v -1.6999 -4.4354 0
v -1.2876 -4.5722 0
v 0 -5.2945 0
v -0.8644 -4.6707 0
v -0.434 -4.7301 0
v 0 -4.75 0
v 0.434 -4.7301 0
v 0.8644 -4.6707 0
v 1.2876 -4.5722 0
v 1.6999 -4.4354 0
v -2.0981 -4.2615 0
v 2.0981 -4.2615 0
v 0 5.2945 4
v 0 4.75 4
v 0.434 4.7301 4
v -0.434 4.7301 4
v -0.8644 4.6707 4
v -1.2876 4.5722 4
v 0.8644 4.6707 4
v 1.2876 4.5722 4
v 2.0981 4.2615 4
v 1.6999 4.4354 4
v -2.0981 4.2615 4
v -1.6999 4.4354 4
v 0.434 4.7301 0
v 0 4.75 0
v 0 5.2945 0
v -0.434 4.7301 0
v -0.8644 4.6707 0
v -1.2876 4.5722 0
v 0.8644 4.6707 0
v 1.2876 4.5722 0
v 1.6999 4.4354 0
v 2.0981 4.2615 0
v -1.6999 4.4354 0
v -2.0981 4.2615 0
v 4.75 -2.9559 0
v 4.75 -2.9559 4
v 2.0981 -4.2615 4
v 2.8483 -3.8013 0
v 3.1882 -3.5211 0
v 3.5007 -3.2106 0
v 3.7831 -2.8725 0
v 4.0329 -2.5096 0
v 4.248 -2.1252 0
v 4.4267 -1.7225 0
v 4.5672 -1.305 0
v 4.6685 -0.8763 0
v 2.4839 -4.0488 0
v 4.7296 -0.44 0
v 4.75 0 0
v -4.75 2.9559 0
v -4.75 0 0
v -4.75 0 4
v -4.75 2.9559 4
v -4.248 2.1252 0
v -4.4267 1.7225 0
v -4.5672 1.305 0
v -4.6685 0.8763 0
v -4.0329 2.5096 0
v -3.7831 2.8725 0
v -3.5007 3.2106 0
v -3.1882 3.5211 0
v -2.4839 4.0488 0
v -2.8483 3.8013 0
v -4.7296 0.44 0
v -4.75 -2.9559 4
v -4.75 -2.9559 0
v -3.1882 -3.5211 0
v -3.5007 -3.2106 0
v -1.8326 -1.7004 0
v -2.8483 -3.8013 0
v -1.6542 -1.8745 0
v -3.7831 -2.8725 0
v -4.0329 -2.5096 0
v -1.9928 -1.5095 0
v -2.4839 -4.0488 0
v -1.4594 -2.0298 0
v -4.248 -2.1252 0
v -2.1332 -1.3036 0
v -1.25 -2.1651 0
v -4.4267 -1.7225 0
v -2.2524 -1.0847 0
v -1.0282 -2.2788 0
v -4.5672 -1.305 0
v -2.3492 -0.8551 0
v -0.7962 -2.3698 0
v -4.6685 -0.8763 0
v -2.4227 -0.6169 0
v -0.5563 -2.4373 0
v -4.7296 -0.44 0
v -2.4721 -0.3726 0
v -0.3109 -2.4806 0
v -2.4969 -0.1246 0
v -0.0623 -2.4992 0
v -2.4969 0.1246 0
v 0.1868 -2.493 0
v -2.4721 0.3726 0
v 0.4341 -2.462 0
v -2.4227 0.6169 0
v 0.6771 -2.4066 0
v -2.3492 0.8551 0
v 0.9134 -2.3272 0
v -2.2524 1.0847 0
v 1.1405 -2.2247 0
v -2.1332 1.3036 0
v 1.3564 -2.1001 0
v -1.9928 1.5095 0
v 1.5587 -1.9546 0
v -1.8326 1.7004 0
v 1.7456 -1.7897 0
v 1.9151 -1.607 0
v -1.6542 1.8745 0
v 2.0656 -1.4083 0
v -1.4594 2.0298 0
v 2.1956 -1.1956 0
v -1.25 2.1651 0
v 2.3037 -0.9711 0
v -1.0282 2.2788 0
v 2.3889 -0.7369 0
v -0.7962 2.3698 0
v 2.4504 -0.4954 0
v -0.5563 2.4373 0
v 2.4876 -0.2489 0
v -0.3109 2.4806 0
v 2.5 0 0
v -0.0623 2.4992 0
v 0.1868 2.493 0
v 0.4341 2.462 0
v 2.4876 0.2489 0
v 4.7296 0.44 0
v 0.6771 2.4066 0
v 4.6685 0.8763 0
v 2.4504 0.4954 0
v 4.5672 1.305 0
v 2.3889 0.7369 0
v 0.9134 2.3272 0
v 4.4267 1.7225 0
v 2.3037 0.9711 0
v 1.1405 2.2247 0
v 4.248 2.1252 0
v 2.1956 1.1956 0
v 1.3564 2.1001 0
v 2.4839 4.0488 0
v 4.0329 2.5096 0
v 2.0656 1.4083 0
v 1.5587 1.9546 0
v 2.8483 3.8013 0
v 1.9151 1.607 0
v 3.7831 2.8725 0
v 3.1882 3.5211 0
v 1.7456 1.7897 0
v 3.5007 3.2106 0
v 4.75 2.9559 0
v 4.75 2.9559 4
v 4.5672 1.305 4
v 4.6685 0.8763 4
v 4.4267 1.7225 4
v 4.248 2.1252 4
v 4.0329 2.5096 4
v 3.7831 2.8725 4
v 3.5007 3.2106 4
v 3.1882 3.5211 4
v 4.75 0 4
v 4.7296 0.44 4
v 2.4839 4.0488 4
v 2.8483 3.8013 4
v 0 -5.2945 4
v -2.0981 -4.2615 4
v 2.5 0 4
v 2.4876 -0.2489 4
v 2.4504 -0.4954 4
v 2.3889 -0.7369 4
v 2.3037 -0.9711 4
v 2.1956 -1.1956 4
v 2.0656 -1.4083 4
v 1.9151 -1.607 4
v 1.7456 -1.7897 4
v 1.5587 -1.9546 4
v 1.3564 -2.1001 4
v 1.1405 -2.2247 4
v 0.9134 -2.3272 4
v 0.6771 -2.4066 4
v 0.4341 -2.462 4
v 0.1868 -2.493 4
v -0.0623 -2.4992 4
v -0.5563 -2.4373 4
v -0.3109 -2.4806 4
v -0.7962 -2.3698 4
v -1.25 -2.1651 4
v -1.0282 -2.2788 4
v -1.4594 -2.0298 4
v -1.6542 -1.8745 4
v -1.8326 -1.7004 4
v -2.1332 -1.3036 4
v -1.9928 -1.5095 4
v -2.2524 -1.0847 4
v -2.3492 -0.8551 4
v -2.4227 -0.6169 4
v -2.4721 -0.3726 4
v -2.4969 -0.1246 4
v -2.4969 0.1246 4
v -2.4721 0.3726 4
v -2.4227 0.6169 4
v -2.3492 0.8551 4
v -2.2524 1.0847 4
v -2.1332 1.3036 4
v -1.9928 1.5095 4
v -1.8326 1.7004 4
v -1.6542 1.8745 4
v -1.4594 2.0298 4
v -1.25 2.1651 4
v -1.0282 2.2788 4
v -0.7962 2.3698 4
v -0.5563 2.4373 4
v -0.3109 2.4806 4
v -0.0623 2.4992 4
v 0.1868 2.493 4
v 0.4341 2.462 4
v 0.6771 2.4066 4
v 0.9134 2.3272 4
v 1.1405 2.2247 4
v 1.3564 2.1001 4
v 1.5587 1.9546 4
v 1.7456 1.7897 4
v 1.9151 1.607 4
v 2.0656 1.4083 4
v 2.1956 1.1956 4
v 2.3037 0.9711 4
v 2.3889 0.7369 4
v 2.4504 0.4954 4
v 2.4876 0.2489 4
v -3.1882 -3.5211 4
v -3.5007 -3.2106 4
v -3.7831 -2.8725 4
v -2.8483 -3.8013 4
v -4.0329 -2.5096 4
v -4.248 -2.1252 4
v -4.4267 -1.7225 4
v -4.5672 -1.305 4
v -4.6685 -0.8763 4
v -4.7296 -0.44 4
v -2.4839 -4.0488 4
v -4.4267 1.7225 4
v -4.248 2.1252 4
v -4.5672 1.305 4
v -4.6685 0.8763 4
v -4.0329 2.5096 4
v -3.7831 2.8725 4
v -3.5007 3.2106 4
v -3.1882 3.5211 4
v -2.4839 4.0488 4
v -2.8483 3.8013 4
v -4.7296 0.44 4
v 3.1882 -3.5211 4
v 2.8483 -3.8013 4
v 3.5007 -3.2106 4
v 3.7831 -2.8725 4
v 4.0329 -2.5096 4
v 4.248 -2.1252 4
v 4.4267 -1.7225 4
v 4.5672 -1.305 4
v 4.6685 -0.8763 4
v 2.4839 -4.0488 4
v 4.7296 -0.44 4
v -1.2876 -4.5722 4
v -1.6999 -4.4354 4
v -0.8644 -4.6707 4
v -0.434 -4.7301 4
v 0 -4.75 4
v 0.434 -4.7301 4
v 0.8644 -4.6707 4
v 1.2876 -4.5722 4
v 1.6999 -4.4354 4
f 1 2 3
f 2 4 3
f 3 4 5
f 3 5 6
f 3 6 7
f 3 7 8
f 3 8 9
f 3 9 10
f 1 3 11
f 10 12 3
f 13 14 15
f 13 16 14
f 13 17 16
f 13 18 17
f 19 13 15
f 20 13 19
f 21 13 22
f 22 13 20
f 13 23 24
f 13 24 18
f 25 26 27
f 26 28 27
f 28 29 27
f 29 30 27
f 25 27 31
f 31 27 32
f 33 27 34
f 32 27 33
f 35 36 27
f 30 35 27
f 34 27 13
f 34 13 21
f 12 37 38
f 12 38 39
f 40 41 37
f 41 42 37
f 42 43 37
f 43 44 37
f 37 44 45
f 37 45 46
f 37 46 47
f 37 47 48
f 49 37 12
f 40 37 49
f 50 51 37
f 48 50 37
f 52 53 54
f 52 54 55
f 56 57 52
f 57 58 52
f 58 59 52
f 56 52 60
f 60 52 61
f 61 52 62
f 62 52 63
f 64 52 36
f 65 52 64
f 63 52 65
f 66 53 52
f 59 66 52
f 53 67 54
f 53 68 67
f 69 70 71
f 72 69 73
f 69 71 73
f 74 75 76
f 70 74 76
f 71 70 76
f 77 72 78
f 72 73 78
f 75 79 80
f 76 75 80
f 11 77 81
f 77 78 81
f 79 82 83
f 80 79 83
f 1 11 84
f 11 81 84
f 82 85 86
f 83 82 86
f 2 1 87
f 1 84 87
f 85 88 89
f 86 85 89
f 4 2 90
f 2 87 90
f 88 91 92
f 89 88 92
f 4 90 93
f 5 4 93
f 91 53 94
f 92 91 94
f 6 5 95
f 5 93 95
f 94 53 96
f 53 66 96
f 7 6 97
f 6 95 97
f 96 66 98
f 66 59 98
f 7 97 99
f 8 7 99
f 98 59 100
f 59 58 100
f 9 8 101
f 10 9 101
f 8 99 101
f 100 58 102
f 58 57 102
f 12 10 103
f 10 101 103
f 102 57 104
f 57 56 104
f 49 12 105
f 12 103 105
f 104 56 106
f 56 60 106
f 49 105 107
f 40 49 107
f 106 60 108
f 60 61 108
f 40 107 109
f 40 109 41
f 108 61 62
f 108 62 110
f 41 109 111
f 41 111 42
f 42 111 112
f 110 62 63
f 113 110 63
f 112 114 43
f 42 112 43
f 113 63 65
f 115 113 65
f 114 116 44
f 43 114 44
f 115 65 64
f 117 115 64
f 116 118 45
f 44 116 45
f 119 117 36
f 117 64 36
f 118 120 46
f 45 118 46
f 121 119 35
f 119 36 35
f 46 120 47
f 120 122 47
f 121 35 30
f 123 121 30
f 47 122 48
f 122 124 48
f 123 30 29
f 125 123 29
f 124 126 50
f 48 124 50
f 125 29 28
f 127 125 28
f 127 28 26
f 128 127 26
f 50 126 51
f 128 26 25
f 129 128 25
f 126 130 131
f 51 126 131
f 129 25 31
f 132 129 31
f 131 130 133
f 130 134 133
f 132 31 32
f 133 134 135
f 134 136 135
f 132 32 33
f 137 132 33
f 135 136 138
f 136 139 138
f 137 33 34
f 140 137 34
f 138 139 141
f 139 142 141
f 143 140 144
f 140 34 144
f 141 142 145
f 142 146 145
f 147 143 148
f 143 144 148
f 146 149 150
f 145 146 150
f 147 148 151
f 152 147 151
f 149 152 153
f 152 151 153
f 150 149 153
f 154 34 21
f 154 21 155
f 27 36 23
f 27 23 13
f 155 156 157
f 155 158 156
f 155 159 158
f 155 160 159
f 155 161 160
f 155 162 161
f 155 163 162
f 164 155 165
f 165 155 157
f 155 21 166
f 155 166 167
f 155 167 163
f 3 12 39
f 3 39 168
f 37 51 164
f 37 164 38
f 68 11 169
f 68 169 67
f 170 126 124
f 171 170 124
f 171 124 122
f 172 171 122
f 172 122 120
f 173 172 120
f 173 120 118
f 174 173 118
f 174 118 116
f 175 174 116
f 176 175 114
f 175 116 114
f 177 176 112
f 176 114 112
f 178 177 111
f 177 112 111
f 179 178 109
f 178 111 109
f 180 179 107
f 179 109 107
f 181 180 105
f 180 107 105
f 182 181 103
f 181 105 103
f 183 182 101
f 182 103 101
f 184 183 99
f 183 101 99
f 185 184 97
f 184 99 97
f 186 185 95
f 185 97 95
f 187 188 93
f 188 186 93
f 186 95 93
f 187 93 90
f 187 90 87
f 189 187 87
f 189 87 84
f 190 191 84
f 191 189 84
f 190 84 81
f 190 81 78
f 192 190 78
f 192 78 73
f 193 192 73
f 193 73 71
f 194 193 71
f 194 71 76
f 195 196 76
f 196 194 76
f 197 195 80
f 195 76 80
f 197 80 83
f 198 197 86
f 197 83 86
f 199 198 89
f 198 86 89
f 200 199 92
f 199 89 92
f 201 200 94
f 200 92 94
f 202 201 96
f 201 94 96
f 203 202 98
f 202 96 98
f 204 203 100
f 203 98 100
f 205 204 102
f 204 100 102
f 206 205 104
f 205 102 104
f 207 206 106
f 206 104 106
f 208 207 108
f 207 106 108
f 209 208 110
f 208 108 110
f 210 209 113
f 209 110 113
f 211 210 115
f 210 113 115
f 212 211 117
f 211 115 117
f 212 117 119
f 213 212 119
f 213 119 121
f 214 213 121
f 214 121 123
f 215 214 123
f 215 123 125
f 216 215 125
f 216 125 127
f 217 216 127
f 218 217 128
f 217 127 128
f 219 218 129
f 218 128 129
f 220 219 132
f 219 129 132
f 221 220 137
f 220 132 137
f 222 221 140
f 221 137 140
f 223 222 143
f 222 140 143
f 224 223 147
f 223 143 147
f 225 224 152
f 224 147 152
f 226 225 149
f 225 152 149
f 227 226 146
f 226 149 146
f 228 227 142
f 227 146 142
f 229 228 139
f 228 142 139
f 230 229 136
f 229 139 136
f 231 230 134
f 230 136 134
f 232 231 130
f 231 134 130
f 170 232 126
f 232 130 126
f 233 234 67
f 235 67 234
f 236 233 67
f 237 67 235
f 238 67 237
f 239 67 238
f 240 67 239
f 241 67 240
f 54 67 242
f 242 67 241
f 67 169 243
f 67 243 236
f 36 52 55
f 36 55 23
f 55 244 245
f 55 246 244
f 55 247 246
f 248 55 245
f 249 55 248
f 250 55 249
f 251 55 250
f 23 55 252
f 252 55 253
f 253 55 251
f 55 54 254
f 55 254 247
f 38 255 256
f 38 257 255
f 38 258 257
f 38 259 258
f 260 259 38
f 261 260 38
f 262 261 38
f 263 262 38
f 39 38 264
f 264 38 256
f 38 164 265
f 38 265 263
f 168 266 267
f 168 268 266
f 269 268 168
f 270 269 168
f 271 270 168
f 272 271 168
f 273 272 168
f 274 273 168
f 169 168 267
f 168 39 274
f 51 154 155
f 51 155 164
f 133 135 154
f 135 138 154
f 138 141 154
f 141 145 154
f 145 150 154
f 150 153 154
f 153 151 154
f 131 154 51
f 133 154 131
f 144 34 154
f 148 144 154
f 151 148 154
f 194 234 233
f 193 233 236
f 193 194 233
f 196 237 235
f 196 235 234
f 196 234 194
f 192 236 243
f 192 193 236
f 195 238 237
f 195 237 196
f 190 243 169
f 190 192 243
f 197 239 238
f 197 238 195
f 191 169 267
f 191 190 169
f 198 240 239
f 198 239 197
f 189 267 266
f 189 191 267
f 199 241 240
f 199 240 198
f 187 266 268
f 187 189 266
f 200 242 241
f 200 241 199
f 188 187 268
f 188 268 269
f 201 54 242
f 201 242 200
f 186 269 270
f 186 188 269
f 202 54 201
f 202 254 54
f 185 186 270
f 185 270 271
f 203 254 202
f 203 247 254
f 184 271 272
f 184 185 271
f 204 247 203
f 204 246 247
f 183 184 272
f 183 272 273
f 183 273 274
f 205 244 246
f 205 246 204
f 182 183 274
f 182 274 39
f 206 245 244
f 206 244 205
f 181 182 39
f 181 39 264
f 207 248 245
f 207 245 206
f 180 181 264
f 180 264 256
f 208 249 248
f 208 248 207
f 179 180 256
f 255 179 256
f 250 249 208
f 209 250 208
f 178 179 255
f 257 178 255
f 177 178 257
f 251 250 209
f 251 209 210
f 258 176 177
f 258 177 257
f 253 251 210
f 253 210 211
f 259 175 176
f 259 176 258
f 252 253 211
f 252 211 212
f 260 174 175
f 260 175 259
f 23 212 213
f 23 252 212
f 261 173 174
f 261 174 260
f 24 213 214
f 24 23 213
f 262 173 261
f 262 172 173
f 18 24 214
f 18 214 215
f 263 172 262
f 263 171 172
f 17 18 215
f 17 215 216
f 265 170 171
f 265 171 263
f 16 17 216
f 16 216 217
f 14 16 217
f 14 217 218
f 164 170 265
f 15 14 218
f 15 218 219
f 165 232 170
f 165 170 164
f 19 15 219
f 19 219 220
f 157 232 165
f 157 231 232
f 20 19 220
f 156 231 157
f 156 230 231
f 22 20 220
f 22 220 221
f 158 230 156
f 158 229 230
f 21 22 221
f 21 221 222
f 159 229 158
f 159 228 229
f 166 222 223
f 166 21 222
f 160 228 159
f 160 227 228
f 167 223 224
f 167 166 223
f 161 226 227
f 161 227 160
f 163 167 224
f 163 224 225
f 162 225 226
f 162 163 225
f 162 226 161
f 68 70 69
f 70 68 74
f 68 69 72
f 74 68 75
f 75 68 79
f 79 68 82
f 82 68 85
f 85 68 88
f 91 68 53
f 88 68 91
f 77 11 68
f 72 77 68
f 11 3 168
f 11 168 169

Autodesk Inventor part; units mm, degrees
ref_plane "YZ Plane" through (0, 0, 0) normal (1, 0, 0) x (0, 1, 0)
ref_plane "XZ Plane" through (0, 0, 0) normal (0, 1, 0) x (-1, 0, 0)
ref_plane "XY Plane" through (0, 0, 0) normal (0, 0, 1) x (1, 0, 0)
sketch "Sketch1" plane through (0, 0, 0) normal (0, 0, 1) x (1, 0, 0)
  line L0 (-4.75, 2.9559) -> (0, 5.2945)
  line L1 (0, 5.2945) -> (4.75, 2.9559)
  line L2 (4.75, 2.9559) -> (4.75, -2.9559)
  line L3 (4.75, -2.9559) -> (0, -5.2945)
  line L4 (0, -5.2945) -> (-4.75, -2.9559)
  line L5 (-4.75, -2.9559) -> (-4.75, 2.9559)
  circle A0 centre (0, 0) radius 2.5
  circle A1 centre (0, 0) radius 4.75
  point P0 (4.75, 0)
  dimension "d6" = 5
  dimension "d8" = 9.5
extrude "Extrusion1" add sketch "Sketch1" along normal blind 4
properties part number "M5-nut"
